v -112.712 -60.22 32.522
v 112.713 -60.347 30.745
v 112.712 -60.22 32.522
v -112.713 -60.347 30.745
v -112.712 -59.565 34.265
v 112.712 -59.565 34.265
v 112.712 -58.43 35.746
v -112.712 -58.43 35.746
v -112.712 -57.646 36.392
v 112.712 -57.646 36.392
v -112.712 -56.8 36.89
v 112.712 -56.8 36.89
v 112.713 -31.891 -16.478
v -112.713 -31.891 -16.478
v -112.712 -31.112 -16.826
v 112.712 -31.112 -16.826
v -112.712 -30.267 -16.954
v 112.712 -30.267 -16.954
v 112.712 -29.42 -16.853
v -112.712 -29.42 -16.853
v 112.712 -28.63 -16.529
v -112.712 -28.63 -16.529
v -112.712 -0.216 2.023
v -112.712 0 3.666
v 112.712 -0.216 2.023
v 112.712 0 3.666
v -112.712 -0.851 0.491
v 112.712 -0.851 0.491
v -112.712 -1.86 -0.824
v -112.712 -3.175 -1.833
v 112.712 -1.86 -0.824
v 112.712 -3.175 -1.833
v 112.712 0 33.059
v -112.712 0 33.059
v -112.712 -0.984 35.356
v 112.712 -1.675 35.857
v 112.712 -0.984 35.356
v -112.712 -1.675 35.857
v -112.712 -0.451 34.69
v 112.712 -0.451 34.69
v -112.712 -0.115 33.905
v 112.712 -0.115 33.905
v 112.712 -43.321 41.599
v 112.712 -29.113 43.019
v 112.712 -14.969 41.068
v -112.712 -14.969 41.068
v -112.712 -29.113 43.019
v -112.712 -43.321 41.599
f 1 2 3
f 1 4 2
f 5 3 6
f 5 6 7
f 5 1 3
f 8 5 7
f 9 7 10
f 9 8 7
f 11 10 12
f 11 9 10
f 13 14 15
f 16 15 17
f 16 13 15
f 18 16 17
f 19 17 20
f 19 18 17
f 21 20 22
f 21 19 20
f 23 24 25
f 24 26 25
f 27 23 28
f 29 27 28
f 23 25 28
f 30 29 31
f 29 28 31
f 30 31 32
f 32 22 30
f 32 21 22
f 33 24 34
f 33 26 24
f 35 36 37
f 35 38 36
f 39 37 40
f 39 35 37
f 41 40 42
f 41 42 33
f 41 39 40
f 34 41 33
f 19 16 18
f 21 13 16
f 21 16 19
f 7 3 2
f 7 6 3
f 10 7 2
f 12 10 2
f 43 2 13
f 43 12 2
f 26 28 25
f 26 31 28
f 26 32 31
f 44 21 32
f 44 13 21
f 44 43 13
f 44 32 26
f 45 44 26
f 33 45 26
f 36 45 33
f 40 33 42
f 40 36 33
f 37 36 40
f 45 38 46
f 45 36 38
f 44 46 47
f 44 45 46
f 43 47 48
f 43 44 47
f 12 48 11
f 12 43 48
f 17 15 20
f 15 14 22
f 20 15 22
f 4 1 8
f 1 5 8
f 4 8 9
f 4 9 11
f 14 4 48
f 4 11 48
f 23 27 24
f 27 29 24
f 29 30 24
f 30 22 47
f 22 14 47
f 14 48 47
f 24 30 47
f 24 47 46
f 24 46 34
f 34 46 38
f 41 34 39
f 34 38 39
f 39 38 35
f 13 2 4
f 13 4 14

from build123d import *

# Parameters (mm, degrees)
F1_DEPTH = 112.7125
F2_R     = 6.35
F3_R     = 3.175
F5_DEPTH = 225.425


# Not quite as in the source:
# - a feature of the source that left no trace in its solid (it failed there, or was rolled back) is left out


with BuildPart() as f1:
    # F0 (on Right) → F1 (new body, symmetric)
    with BuildSketch(Plane.YZ):
        with BuildLine():
            ThreePointArc((-60.4918744543, 34.925), (-52.3875, 4.6790627728), (-30.2459372272, -17.4625))
            Line((-30.2459372272, -17.4625), (0, 0))
            Line((0, 0), (0, 34.925))
            ThreePointArc((0, 34.925), (-30.2459372272, 43.0293744543), (-60.4918744543, 34.925))
        make_face()
    extrude(amount=F1_DEPTH, both=True)

    # F2
    f2_edges = [f1.edges().sort_by_distance(p)[0] for p in [
        (0, -60.491874, 34.925),
        (0, 0, 0),
    ]]
    fillet(f2_edges, radius=F2_R)

    # F3
    f3_edges = [f1.edges().sort_by_distance(p)[0] for p in [
        (0, 0, 34.925),
        (0, -30.245937, -17.4625),
    ]]
    fillet(f3_edges, radius=F3_R)

    # F4 (on face) → F5 (cut, through all)
    with BuildSketch(Plane(origin=(-112.7125, 0, 0), x_dir=(0, -1, 0), z_dir=(-1, 0, 0))):
        Polygon((66.0401198141, 27.3149197272), (60.347308239, 30.7453752193), (31.890989487, -16.4776425833), (37.5838010621, -19.9080980754), align=None)
    extrude(amount=-F5_DEPTH, mode=Mode.SUBTRACT)


solid = f1.part
